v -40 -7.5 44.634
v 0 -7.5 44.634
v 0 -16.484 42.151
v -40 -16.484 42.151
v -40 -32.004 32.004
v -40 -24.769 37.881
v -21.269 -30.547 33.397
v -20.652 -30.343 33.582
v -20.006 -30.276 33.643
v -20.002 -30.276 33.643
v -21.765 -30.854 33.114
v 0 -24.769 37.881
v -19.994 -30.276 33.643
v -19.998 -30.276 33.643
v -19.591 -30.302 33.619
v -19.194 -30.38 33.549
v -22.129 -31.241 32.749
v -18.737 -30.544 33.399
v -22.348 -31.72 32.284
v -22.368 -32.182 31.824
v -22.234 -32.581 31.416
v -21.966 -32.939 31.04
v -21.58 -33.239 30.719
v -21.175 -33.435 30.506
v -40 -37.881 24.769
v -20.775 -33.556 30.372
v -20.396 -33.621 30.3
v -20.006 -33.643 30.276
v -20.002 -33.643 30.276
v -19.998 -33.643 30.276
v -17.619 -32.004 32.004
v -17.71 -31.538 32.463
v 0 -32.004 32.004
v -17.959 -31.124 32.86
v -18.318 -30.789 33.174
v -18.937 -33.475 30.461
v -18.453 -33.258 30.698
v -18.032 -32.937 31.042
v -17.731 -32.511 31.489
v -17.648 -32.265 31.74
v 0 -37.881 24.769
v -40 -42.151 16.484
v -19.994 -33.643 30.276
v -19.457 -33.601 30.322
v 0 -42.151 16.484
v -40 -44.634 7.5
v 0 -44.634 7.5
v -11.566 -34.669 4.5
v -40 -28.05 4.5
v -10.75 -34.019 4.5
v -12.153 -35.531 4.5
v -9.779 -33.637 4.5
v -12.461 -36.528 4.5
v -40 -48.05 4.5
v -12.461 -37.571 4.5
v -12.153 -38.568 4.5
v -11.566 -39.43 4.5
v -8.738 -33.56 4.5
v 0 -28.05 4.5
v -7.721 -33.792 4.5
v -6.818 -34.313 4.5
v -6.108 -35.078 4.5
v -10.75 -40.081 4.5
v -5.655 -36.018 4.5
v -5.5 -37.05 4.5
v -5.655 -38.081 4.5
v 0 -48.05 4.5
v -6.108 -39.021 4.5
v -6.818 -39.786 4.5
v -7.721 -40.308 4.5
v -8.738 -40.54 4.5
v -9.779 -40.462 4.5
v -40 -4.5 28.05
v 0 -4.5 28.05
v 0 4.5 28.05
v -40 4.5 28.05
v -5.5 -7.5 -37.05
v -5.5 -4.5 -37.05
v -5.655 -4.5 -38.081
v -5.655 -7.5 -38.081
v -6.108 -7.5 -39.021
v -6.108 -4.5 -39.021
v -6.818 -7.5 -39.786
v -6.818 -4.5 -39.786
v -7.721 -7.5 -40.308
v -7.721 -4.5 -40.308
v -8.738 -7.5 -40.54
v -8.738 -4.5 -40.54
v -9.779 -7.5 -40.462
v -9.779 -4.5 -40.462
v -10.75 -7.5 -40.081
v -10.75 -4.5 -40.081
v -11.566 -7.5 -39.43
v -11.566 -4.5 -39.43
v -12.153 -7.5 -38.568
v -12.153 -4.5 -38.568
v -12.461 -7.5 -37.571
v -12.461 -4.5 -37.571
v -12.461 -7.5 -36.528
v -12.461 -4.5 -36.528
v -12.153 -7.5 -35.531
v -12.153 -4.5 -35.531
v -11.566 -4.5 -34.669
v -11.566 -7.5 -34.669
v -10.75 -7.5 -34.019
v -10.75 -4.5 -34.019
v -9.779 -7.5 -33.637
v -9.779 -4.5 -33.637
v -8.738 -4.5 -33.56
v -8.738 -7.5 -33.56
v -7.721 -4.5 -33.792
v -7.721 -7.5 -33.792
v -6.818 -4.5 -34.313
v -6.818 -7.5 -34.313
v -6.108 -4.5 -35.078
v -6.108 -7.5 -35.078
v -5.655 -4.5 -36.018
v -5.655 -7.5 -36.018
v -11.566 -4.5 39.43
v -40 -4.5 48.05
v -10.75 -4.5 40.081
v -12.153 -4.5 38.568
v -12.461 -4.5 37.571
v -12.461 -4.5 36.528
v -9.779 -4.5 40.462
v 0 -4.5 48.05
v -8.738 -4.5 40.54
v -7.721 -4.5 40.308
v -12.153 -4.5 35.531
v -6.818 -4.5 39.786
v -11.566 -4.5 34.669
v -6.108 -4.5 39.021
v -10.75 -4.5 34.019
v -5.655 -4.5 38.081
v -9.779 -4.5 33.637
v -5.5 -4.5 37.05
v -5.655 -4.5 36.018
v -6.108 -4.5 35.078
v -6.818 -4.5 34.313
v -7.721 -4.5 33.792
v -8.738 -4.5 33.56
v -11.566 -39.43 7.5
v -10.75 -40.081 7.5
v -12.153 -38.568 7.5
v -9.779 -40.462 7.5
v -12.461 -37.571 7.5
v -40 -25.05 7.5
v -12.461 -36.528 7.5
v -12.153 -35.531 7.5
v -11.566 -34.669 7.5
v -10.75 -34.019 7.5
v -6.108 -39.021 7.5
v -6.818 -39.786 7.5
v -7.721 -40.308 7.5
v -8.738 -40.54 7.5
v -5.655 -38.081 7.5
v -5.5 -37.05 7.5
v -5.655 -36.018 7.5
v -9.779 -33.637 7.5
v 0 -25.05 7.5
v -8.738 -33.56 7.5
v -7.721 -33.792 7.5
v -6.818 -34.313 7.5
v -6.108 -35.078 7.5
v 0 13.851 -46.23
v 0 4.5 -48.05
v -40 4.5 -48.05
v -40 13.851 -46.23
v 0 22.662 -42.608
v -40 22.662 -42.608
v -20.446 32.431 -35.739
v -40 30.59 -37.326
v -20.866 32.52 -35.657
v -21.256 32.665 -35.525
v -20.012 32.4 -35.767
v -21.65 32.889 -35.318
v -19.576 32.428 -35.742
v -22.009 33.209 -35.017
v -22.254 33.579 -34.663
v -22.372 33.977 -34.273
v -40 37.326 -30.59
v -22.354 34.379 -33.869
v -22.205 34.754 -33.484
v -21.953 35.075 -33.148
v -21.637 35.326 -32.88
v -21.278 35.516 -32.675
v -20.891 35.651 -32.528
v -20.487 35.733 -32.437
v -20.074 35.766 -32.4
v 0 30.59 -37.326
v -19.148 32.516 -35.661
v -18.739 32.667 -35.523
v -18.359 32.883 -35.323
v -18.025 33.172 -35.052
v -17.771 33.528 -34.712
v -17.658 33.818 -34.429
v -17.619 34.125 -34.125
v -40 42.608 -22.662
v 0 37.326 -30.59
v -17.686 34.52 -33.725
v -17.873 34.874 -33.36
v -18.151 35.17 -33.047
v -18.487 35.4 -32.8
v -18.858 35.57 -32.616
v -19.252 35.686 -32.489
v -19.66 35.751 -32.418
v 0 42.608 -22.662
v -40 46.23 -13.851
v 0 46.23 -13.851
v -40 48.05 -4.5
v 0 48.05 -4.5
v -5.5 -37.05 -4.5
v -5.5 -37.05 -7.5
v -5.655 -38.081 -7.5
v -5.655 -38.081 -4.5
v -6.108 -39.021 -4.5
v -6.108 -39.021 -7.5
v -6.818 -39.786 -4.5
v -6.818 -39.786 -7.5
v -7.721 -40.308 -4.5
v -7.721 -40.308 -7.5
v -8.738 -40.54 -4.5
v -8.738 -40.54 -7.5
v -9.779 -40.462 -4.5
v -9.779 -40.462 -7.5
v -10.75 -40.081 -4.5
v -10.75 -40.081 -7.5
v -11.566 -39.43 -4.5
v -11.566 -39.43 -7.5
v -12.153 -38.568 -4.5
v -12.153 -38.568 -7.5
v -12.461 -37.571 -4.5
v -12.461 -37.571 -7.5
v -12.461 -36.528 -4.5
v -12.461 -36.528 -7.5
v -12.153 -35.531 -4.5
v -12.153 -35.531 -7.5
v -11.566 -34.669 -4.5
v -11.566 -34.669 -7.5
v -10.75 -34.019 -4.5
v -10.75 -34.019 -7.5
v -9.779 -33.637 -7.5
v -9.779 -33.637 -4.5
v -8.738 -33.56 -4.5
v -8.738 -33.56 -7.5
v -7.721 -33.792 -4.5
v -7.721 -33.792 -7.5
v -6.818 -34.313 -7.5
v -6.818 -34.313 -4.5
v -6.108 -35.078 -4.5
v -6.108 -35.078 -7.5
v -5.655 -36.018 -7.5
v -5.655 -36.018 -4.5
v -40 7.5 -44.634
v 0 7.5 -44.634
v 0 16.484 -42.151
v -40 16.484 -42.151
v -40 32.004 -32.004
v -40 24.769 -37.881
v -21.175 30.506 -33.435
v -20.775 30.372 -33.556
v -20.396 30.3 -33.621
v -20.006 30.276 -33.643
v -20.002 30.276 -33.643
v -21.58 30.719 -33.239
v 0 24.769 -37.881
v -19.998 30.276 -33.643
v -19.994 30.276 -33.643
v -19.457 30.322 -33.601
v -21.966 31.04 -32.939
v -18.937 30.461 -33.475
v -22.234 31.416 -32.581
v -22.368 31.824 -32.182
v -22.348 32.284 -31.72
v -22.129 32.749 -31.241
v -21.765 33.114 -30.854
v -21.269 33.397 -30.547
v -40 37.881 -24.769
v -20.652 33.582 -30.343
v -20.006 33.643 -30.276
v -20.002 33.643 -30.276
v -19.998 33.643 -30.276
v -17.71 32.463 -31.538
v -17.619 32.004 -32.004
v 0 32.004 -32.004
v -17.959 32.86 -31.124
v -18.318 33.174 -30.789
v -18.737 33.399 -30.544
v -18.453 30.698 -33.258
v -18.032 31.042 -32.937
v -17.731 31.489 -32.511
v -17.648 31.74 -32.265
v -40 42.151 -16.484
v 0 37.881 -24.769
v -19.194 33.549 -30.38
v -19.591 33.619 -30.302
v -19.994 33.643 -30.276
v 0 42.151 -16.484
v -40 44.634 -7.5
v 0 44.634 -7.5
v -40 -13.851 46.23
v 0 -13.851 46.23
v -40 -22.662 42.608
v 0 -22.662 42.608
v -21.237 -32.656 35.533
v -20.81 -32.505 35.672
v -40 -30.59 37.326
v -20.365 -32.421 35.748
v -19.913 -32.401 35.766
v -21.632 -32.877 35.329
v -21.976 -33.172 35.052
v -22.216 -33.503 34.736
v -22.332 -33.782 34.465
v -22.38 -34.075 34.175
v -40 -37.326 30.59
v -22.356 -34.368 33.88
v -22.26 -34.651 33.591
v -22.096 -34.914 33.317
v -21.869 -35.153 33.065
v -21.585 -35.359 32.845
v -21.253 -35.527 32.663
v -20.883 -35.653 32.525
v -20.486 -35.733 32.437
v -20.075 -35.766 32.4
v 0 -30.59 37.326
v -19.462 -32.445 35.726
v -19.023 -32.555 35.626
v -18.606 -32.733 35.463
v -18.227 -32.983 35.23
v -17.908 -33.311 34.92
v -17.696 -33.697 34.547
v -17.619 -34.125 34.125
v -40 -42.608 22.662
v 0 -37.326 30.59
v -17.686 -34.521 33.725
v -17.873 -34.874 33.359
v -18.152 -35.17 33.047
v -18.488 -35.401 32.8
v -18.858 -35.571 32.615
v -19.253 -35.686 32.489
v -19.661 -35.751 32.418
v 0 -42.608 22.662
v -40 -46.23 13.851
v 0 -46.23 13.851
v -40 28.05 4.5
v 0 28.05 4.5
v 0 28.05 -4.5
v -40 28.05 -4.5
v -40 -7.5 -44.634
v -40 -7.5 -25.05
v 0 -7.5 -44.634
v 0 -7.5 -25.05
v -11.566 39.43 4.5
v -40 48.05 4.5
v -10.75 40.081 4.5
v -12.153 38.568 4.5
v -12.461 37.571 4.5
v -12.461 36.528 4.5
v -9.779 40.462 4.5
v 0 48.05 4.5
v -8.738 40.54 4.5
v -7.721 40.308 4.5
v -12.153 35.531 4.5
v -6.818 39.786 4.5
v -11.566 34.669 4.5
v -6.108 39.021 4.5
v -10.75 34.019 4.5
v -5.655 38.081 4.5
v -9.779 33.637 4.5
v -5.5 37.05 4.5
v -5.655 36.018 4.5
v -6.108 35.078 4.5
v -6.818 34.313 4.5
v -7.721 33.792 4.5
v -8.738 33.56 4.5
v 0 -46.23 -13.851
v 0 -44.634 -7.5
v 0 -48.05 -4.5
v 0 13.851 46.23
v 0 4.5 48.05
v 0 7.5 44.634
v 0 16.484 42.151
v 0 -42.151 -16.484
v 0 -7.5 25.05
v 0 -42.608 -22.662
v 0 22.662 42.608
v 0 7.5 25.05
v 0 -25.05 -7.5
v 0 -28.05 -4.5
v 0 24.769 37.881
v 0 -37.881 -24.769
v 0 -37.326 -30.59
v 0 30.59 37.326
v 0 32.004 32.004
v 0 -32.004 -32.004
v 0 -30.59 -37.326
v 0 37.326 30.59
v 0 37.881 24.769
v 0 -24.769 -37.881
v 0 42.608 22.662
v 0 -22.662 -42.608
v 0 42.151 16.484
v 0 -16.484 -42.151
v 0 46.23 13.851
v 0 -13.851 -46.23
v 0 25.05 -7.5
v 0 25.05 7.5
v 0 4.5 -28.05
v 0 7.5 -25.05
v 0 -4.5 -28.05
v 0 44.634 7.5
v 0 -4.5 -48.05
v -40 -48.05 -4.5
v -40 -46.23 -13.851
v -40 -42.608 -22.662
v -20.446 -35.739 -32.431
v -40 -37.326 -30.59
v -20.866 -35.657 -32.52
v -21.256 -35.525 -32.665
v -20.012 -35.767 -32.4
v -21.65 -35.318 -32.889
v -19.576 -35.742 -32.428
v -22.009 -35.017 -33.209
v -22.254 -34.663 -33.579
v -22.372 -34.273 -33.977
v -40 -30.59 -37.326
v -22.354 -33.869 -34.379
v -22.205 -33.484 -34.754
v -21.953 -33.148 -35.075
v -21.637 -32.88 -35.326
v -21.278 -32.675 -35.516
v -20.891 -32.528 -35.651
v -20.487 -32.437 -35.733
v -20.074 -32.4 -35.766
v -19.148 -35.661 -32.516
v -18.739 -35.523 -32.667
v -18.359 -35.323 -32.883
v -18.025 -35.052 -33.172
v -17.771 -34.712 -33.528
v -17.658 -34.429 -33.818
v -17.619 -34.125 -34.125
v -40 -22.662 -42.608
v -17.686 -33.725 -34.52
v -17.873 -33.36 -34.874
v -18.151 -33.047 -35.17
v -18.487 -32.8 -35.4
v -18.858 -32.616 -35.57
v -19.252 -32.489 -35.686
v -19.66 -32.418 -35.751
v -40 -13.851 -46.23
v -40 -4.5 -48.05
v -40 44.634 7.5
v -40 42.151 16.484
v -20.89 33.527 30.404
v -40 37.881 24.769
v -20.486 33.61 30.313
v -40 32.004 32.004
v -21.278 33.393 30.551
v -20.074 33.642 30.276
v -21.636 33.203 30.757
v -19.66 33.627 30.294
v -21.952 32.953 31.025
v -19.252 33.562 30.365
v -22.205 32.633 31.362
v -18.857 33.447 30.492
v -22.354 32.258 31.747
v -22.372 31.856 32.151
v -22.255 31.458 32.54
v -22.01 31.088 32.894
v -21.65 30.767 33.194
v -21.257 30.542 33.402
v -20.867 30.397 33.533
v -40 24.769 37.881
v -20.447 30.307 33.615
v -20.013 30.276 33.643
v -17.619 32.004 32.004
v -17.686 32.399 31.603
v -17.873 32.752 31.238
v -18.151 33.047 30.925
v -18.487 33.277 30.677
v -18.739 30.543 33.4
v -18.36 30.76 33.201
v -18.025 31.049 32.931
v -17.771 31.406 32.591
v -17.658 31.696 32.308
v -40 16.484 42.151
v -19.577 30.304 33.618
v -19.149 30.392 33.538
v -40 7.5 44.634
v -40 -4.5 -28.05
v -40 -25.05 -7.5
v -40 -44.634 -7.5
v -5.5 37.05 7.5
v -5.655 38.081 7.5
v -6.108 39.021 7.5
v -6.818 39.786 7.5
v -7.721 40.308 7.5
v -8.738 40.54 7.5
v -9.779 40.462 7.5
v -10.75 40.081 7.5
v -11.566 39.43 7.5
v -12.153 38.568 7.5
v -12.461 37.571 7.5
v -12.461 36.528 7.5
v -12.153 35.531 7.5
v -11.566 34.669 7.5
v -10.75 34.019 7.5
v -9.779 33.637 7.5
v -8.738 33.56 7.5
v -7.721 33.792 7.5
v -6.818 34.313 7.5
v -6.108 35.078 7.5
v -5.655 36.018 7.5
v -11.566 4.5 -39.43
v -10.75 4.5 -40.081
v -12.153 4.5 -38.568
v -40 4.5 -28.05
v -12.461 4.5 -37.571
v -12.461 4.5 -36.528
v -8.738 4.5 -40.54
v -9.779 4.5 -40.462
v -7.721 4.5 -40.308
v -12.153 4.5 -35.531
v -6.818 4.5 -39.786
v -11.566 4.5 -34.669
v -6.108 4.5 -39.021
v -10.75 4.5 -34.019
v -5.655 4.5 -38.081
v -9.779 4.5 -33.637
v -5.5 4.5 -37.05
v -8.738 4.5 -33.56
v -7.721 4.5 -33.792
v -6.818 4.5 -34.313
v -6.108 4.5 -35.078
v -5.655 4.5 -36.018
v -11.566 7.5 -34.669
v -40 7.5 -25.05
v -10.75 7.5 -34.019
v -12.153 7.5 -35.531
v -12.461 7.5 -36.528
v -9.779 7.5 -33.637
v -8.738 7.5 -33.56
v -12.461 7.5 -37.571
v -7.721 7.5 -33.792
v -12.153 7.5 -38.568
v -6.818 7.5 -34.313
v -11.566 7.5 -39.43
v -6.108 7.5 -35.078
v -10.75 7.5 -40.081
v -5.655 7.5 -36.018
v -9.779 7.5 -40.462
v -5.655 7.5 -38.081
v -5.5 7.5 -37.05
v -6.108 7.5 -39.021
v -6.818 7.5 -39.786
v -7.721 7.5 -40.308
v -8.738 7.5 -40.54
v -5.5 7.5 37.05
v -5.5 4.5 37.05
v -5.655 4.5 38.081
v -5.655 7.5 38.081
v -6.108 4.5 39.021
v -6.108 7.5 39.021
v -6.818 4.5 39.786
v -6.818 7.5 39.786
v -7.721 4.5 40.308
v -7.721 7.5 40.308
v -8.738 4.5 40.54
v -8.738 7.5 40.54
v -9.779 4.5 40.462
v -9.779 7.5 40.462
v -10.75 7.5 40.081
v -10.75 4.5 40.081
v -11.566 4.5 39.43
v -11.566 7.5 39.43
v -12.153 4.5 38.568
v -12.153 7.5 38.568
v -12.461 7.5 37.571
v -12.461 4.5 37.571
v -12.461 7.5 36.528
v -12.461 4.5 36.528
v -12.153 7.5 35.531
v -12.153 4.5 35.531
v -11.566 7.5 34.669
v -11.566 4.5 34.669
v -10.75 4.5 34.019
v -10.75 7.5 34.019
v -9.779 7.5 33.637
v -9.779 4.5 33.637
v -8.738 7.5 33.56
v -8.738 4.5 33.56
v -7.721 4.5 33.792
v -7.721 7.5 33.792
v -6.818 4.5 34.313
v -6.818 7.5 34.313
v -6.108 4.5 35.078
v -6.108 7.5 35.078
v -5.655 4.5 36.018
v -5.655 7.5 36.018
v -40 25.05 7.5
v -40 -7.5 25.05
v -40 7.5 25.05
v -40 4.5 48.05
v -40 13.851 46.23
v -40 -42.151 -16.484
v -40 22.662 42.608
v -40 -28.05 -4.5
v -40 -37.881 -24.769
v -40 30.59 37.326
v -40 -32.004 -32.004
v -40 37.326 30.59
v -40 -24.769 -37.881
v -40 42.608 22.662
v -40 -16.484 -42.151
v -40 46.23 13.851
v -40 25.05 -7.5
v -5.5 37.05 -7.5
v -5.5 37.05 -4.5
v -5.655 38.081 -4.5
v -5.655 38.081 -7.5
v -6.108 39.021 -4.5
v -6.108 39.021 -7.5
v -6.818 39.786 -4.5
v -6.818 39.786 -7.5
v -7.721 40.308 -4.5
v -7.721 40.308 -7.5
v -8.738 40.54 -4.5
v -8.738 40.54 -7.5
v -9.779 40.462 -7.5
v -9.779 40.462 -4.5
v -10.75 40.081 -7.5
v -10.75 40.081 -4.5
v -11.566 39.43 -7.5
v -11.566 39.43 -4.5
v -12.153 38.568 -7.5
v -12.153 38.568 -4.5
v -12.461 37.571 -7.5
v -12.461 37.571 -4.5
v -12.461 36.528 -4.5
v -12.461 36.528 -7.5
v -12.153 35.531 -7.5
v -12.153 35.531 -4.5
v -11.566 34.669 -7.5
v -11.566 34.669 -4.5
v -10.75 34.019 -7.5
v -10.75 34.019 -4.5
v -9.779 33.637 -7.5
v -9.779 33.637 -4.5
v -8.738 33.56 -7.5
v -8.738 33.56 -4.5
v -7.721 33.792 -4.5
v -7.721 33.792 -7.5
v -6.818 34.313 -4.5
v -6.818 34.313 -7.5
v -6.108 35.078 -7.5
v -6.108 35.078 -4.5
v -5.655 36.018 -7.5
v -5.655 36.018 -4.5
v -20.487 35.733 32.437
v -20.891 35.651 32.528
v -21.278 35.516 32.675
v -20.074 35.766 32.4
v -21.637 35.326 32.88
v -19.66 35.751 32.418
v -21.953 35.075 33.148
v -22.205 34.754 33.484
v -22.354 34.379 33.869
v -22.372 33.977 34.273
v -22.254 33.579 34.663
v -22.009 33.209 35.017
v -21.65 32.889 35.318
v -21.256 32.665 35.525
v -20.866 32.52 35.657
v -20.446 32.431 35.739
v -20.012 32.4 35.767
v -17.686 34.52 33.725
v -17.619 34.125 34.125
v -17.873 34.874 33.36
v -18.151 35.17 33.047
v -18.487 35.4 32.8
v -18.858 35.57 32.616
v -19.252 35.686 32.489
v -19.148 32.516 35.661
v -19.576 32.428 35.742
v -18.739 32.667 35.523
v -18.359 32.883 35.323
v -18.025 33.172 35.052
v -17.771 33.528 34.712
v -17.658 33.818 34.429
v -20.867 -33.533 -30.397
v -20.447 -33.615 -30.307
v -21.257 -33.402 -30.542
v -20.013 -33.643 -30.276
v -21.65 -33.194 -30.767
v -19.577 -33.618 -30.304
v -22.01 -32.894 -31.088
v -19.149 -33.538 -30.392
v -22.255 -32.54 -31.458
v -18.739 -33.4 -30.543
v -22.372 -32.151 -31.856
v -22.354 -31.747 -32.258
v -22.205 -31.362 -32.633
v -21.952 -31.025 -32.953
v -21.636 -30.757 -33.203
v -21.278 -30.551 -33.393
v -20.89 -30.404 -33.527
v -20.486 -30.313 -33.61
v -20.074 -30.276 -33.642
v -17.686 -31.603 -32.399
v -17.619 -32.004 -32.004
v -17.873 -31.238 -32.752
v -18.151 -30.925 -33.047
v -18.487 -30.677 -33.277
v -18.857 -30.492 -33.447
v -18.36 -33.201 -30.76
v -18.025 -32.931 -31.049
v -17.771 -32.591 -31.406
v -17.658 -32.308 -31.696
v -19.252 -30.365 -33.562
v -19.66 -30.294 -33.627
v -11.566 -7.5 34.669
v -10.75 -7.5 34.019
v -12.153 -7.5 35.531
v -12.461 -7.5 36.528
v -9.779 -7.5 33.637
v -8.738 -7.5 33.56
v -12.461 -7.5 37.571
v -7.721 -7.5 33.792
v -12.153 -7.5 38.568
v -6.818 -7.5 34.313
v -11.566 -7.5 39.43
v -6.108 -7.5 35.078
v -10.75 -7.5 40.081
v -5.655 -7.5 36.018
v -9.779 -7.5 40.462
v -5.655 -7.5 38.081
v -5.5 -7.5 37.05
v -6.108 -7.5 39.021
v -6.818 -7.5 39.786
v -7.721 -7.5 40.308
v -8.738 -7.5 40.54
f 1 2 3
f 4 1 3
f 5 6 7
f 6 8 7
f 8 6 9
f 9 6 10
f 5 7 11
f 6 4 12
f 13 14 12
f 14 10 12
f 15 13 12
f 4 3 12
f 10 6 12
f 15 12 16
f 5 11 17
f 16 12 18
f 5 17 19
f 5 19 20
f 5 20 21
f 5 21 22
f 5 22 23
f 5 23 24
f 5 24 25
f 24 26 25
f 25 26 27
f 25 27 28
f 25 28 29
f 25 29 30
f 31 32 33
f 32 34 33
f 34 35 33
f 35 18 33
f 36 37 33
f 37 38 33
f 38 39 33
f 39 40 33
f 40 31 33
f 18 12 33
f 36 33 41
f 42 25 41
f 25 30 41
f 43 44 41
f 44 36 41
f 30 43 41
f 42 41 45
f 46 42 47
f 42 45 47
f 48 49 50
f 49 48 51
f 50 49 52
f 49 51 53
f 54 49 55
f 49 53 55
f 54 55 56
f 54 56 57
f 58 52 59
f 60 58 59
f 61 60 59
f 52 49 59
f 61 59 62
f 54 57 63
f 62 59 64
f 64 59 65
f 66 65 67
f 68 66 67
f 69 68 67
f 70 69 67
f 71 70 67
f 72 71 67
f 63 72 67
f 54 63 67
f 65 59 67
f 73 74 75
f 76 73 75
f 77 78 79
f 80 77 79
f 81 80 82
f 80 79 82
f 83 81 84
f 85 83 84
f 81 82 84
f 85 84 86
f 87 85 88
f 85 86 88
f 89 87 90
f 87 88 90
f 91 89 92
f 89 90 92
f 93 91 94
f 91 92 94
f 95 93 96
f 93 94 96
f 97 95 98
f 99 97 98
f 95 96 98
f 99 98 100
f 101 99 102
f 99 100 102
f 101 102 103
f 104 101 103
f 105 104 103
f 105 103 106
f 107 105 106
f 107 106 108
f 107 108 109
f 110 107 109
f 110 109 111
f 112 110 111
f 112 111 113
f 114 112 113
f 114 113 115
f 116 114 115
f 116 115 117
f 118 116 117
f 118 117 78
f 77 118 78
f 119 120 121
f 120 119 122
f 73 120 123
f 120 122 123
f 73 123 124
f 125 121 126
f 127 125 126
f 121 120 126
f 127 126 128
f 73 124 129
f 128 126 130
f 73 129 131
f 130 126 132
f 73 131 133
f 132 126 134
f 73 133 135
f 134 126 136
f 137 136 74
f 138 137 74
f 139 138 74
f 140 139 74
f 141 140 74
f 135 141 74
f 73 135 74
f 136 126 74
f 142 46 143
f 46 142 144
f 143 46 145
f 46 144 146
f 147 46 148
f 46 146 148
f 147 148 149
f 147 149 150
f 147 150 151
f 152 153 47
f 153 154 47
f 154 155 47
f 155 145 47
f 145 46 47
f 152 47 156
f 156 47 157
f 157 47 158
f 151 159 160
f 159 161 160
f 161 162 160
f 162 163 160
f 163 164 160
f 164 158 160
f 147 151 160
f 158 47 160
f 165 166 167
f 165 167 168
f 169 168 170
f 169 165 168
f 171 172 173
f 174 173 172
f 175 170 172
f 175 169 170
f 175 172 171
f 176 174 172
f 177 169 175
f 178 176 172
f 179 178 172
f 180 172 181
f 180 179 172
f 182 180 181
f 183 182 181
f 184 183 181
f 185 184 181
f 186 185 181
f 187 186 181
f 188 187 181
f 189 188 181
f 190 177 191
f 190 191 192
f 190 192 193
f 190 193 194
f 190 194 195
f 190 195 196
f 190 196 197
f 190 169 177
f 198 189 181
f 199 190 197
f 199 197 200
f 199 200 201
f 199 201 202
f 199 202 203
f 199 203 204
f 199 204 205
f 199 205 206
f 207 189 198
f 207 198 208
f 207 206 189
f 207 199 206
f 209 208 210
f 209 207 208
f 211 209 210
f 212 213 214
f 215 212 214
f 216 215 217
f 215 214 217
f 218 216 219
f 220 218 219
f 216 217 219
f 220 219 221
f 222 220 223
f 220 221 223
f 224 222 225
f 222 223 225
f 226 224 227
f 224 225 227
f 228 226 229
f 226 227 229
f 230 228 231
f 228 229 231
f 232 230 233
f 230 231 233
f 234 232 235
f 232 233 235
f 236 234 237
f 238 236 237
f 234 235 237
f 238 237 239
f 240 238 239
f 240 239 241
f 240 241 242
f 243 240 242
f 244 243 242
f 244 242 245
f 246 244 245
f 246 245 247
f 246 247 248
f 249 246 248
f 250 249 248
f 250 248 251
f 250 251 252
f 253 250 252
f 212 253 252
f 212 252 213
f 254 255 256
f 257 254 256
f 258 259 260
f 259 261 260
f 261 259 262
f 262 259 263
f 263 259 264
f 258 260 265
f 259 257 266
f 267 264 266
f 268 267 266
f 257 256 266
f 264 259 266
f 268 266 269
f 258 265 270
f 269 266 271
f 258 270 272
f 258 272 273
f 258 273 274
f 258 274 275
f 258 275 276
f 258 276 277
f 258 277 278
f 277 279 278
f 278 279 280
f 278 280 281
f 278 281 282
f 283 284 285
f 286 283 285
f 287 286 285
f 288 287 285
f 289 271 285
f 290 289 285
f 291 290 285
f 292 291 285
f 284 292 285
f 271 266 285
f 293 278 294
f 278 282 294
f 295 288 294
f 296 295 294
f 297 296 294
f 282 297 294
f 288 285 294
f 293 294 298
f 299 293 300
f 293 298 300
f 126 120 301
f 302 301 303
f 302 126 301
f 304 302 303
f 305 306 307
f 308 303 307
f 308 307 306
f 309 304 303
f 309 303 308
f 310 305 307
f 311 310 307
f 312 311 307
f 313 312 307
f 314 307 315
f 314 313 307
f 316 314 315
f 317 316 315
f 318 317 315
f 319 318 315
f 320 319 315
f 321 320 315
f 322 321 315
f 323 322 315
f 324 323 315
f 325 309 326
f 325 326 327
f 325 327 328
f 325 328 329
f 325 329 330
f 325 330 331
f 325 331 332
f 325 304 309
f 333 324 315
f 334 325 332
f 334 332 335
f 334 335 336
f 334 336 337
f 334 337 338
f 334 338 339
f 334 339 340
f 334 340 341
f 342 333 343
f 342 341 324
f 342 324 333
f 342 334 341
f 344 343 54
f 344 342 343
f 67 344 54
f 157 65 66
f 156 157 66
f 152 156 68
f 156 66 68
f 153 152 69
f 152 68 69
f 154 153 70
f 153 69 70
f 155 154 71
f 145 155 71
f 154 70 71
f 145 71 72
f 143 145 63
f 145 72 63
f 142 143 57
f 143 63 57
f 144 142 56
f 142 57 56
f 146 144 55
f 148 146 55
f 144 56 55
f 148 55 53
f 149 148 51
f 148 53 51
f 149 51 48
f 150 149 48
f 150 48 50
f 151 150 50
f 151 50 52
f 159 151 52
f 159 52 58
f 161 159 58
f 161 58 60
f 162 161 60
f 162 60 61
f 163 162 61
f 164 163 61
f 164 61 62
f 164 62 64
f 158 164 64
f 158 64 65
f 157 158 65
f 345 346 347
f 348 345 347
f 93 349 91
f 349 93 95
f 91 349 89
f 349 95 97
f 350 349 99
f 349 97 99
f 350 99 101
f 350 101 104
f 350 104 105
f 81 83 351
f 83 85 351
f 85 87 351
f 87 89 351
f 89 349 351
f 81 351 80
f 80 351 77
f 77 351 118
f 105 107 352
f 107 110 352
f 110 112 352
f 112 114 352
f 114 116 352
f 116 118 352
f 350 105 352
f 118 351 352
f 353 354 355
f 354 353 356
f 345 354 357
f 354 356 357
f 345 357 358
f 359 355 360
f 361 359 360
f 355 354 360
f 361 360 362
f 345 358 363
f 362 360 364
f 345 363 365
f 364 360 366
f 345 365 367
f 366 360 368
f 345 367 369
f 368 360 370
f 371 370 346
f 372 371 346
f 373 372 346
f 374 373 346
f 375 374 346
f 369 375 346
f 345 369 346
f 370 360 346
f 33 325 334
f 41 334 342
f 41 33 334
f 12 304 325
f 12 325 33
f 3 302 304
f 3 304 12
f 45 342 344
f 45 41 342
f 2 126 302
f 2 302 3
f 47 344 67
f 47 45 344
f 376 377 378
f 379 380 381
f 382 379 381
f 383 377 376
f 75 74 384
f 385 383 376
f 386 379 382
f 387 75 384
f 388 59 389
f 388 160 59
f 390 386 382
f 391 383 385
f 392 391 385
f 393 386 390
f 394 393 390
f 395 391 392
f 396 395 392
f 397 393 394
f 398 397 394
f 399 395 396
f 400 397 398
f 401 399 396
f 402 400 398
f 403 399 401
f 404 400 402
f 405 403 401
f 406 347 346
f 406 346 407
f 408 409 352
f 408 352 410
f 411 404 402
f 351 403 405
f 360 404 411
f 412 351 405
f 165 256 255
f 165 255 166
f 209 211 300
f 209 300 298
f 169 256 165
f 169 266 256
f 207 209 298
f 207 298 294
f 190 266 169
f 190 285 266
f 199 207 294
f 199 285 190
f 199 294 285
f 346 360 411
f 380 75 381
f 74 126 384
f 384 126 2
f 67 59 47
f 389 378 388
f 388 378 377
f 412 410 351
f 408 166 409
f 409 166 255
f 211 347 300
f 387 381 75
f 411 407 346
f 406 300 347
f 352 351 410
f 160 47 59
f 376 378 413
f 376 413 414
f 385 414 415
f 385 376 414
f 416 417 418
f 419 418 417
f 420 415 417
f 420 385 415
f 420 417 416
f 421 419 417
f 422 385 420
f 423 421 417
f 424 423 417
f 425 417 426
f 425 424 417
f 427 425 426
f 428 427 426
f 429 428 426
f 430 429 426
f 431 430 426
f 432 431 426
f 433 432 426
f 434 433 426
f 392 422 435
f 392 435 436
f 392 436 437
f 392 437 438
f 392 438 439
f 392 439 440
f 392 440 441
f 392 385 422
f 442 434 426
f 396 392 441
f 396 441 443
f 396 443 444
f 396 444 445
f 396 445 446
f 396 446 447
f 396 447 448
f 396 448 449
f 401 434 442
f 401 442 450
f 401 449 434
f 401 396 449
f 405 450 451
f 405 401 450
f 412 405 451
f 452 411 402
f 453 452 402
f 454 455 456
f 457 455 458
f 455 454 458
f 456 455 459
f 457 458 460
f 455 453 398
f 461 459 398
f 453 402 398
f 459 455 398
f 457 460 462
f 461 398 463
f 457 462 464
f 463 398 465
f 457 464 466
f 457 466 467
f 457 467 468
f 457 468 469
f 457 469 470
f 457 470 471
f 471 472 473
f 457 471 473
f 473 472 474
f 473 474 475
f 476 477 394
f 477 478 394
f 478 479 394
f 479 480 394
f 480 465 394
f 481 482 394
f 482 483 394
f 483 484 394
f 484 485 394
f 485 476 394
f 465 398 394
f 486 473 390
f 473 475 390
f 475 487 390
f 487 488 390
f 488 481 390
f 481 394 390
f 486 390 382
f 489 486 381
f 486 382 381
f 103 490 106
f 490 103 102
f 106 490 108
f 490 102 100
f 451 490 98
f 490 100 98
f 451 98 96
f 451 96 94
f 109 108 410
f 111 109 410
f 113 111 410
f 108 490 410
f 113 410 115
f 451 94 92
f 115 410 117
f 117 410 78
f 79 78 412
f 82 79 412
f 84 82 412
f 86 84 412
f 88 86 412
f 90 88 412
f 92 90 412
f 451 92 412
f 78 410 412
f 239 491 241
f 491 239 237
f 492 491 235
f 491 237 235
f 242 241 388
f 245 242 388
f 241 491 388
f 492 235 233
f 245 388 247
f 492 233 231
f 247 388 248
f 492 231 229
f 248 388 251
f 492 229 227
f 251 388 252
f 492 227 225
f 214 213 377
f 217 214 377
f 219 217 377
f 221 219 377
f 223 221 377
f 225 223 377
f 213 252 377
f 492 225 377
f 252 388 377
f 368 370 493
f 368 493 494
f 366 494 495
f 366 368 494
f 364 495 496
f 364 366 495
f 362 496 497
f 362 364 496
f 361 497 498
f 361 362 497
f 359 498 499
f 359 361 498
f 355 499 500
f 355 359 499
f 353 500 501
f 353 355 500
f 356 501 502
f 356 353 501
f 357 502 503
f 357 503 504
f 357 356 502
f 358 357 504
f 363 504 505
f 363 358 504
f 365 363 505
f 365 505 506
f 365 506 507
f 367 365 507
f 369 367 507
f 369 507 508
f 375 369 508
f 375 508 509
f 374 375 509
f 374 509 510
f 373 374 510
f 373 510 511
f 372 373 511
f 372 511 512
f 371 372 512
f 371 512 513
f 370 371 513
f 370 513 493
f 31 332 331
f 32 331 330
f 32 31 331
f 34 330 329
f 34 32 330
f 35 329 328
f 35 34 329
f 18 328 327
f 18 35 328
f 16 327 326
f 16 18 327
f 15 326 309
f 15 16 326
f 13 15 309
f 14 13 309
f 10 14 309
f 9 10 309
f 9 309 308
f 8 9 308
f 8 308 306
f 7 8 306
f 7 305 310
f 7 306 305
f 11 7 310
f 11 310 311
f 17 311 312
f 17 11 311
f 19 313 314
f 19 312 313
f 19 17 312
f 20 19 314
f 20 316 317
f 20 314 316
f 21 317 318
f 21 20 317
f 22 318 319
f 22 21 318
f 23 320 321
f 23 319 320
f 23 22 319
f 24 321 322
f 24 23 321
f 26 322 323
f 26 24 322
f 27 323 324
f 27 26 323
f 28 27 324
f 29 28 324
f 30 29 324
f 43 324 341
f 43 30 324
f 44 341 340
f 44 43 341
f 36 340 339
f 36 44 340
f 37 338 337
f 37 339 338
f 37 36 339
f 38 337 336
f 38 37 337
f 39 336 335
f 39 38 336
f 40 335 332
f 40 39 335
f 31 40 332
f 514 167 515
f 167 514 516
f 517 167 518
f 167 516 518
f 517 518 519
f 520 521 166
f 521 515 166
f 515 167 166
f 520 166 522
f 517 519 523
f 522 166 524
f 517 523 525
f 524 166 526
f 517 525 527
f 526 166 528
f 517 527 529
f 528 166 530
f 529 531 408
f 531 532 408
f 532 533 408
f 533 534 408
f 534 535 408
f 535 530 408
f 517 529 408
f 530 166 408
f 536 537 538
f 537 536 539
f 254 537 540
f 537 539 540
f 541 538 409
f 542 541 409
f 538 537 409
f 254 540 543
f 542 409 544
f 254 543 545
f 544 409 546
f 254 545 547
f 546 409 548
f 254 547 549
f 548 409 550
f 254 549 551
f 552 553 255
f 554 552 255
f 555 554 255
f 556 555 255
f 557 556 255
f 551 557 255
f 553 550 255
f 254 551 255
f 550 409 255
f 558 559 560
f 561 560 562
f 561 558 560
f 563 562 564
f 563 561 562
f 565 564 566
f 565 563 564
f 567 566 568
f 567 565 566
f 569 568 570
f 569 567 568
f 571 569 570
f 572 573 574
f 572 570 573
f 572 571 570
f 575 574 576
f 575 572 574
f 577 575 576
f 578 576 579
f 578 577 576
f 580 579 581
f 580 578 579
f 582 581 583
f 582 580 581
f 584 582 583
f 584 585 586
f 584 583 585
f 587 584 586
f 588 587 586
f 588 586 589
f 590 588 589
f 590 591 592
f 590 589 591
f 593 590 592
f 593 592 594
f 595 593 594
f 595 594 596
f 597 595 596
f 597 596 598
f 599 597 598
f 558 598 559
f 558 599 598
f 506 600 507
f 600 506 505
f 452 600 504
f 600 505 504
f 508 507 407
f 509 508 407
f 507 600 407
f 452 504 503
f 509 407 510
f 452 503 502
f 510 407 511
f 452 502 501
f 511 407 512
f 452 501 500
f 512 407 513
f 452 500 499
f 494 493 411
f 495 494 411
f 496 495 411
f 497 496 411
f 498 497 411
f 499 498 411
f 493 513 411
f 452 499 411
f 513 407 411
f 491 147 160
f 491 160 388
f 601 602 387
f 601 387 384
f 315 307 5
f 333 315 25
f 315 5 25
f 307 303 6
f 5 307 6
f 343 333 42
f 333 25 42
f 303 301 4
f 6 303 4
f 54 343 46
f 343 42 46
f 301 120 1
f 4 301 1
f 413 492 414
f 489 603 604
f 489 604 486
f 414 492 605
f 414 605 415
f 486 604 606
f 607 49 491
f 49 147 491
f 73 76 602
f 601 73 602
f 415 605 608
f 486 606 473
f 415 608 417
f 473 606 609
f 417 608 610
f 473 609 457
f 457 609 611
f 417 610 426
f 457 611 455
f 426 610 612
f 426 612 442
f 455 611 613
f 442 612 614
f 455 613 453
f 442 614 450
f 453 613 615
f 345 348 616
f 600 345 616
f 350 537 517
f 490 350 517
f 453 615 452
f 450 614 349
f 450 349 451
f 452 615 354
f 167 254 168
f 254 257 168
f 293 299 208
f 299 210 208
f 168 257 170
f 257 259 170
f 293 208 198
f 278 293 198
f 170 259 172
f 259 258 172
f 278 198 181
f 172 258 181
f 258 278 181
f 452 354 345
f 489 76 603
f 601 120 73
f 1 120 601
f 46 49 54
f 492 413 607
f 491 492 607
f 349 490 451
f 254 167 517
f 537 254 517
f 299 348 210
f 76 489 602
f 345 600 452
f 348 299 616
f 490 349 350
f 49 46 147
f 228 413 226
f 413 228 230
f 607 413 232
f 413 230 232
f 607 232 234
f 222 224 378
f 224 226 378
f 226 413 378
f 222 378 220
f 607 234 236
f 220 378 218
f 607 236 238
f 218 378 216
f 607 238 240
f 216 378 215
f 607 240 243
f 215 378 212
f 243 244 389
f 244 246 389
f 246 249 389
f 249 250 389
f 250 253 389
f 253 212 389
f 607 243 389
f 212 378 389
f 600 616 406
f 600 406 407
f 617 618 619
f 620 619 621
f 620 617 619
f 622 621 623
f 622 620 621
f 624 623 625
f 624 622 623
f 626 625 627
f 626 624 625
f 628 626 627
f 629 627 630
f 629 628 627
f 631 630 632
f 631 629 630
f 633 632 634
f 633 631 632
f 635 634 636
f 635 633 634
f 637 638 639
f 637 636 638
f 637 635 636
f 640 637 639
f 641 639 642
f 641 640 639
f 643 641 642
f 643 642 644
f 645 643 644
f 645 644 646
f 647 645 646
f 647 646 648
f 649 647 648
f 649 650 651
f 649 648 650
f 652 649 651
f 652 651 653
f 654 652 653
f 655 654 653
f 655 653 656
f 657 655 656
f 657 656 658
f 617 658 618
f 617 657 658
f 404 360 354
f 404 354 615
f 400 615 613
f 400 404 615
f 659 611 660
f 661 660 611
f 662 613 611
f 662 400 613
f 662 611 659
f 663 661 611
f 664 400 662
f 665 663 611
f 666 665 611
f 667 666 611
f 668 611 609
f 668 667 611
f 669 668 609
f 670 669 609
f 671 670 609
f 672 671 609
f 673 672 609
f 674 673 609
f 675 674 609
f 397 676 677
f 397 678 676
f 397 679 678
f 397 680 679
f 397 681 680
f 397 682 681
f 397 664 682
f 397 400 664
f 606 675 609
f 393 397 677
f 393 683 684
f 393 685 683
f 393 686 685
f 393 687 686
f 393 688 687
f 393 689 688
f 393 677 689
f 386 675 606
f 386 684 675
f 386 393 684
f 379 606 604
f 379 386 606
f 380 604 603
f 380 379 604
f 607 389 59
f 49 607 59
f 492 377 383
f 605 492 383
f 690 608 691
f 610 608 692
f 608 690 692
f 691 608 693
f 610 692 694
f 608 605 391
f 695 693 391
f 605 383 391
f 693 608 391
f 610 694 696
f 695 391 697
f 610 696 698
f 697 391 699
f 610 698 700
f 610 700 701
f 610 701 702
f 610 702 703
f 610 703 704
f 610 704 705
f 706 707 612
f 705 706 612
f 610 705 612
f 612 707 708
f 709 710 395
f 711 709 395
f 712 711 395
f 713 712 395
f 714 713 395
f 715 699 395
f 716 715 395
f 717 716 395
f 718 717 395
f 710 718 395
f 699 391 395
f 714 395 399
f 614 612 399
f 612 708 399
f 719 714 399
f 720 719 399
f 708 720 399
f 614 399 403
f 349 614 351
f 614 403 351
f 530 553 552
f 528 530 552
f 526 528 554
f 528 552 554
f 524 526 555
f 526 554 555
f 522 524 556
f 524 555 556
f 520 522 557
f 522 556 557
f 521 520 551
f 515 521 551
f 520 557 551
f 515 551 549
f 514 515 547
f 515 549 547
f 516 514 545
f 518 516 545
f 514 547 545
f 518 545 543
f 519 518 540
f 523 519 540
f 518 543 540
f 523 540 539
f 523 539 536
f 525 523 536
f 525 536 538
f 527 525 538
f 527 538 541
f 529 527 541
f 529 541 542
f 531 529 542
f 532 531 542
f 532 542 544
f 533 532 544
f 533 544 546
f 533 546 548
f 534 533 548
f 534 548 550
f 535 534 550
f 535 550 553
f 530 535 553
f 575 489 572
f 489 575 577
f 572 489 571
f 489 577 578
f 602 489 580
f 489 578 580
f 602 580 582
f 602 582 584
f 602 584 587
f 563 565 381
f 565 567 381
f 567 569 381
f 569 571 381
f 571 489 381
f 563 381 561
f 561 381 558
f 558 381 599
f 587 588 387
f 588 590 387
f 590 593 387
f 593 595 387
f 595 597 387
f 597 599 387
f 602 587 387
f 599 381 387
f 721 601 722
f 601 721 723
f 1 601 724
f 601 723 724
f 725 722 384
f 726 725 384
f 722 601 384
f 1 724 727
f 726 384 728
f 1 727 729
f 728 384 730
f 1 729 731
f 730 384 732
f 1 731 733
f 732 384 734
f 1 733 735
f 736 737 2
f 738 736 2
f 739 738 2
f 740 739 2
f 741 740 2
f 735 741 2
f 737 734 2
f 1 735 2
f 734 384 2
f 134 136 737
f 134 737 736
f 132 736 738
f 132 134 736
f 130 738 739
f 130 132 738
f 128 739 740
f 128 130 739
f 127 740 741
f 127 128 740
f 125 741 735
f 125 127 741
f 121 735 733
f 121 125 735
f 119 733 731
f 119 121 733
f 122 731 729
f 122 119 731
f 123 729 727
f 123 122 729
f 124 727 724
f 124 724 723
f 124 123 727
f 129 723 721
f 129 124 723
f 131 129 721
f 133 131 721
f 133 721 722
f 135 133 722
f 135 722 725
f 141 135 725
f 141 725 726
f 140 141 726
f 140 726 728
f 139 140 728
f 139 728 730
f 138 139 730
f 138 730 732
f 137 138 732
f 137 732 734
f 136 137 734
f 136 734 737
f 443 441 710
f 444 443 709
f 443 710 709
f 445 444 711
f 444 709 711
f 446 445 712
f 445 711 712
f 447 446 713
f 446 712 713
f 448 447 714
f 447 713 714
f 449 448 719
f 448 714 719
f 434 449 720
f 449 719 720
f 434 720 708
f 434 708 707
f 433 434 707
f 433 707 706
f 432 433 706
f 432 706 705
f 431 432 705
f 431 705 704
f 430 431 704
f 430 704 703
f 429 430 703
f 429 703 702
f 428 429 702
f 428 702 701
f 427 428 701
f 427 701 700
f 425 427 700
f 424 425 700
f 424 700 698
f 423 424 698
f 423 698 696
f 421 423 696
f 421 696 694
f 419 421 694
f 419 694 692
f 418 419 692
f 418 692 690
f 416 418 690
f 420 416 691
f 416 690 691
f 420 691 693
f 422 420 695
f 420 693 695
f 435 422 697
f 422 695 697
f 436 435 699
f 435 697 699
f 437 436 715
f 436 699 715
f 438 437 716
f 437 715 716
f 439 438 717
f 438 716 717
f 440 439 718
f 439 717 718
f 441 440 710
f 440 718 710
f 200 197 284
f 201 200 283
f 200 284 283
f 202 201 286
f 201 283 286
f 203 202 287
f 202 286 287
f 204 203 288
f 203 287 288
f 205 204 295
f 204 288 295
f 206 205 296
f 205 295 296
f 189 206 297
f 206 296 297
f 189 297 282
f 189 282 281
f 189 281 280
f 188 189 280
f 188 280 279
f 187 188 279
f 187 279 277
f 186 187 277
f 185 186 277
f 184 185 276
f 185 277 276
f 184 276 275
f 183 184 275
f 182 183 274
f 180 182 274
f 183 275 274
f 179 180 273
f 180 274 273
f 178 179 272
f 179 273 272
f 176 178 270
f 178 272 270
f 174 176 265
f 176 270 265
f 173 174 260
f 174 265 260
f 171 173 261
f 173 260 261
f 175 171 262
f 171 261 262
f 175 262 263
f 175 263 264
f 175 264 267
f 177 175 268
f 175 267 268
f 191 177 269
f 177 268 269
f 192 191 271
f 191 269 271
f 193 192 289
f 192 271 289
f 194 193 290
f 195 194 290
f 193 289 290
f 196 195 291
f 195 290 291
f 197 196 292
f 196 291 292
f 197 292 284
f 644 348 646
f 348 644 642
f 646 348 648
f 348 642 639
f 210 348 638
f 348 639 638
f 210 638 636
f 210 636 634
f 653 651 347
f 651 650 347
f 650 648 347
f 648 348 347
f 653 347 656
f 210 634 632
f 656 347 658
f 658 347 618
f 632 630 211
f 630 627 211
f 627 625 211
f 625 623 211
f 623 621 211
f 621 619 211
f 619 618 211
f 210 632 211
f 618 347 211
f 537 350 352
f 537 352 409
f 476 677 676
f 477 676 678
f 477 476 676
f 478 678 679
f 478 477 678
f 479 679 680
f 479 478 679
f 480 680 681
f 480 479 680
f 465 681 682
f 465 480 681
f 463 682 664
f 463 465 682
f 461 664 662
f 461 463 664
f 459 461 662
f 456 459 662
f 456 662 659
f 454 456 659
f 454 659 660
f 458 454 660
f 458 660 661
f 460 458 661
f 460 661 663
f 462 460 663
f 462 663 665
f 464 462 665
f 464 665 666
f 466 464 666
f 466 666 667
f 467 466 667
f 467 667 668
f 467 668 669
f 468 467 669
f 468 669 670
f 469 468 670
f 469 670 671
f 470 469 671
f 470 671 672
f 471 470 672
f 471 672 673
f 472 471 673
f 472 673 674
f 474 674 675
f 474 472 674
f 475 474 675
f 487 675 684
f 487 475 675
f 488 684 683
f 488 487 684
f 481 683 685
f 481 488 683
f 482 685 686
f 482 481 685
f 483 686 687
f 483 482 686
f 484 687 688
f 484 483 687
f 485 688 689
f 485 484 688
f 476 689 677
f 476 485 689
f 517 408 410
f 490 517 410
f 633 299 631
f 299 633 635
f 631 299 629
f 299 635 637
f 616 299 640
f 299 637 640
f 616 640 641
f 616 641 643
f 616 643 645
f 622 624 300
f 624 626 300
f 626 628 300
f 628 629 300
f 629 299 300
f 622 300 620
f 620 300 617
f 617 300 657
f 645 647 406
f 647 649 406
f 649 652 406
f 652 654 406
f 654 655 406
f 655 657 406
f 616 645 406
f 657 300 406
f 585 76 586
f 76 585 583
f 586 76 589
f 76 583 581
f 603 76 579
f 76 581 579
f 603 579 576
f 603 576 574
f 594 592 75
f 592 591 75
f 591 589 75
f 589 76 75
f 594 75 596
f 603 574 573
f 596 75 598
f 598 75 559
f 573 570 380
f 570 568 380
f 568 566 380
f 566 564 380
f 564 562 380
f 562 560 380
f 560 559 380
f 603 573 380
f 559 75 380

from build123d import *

# Parameters (mm, degrees)
SKETCH4_R               = 48.26
BOSS_EXTRUDE2_DEPTH     = 40
CUT_EXTRUDE1_DEPTH      = 41
CIRPATTERN1_COUNT       = 4
CUT_EXTRUDE2_DEPTH      = 40
CUT_EXTRUDE3_START      = -3
SKETCH7_R               = 3.5
CUT_EXTRUDE3_DEPTH      = 15
CUT_EXTRUDE4_START      = -3
SKETCH8_R               = 3.5
CUT_EXTRUDE4_DEPTH      = 15
CUT_EXTRUDE5_START      = -3.062685
SKETCH11_R              = 2.38125
CUT_EXTRUDE5_DEPTH      = 3.062685
SKETCH13_R              = 2.38125
CUT_EXTRUDE6_DEPTH      = 68.952595383
CUT_EXTRUDE6_DEPTH_BACK = 68.952595383


with BuildPart() as part:
    # Sketch4 → Boss-Extrude2 (new body)
    with BuildSketch(Plane(origin=(0, 0, 0), x_dir=(0, 0, -1), z_dir=(1, 0, 0))):
        Circle(SKETCH4_R)
    extrude(amount=-BOSS_EXTRUDE2_DEPTH)

    # Sketch6 → Cut-Extrude1 (cut, through all)
    with BuildSketch(Plane(origin=(0, 0, 0), x_dir=(0, 0, -1), z_dir=(1, 0, 0))):
        Polygon((-4.5, 277.678371005), (-4.5, 48.049740894), (-4.5, 28.049740894), (4.5, 28.049740894), (4.5, 48.049740894), (4.5, 277.678371005), (4.5, 736.935631227), (-4.5, 736.935631227), align=None)
    cut_extrude1 = extrude(amount=-CUT_EXTRUDE1_DEPTH, mode=Mode.SUBTRACT)

    # CirPattern1: Cut-Extrude1 ×4 about axis
    cirpattern1_axis = Axis((0, 0, 0), (1, 0, 0))
    for i in range(1, CIRPATTERN1_COUNT):
        add(cut_extrude1.rotate(cirpattern1_axis, i * 360 / CIRPATTERN1_COUNT), mode=Mode.SUBTRACT)

    # Sketch9 → Cut-Extrude2 (cut)
    with BuildSketch(Plane(origin=(0, 0, 0), x_dir=(0, 0, -1), z_dir=(1, 0, 0))):
        with BuildLine():
            Line((-25.049740894, -7.5), (-44.634264865, -7.5))
            ThreePointArc((-44.634264865, -7.5), (-32.003652917, -32.003652917), (-7.5, -44.634264865))
            Line((-7.5, -44.634264865), (-7.5, -25.049740894))
            Line((-7.5, -25.049740894), (7.5, -25.049740894))
            Line((7.5, -25.049740894), (7.5, -44.634264865))
            ThreePointArc((7.5, -44.634264865), (32.003652917, -32.003652917), (44.634264865, -7.5))
            Line((44.634264865, -7.5), (25.049740894, -7.5))
            Line((25.049740894, -7.5), (25.049740894, 7.5))
            Line((25.049740894, 7.5), (44.634264865, 7.5))
            ThreePointArc((44.634264865, 7.5), (32.003652917, 32.003652917), (7.5, 44.634264865))
            Line((7.5, 44.634264865), (7.5, 25.049740894))
            Line((7.5, 25.049740894), (-7.5, 25.049740894))
            Line((-7.5, 25.049740894), (-7.5, 44.634264865))
            ThreePointArc((-7.5, 44.634264865), (-32.003652917, 32.003652917), (-44.634264865, 7.5))
            Line((-44.634264865, 7.5), (-25.049740894, 7.5))
            Line((-25.049740894, 7.5), (-25.049740894, -7.5))
        make_face()
    extrude(amount=-CUT_EXTRUDE2_DEPTH, mode=Mode.SUBTRACT)

    # Sketch7 → Cut-Extrude3 (cut)
    with BuildSketch(Plane.XY.offset(-4.5).offset(CUT_EXTRUDE3_START)):
        with Locations((-9, 37.049740894)):
            Circle(SKETCH7_R)
    cut_extrude3 = extrude(amount=CUT_EXTRUDE3_DEPTH, mode=Mode.SUBTRACT)

    # Sketch8 → Cut-Extrude4 (cut)
    with BuildSketch(Plane.XZ.offset(-4.5).offset(CUT_EXTRUDE4_START)):
        with Locations((-9, 37.049740894)):
            Circle(SKETCH8_R)
    cut_extrude4 = extrude(amount=CUT_EXTRUDE4_DEPTH, mode=Mode.SUBTRACT)

    # Mirror1: Cut-Extrude3 across plane
    add(cut_extrude3.mirror(Plane.ZX), mode=Mode.SUBTRACT)

    # Mirror2: Cut-Extrude4 across plane
    add(cut_extrude4.mirror(Plane.XY), mode=Mode.SUBTRACT)

    # Sketch11 → Cut-Extrude5 (cut)
    with BuildSketch(Plane(origin=(0, -34.12497326, 34.12497326), x_dir=(1, 0, 0), z_dir=(0, -0.707106781, 0.707106781)).offset(CUT_EXTRUDE5_START)):
        with Locations((-20, 0)):
            Circle(SKETCH11_R)
    cut_extrude5 = extrude(amount=CUT_EXTRUDE5_DEPTH, mode=Mode.SUBTRACT)

    # Mirror3: Cut-Extrude5 across plane
    add(cut_extrude5.mirror(Plane(origin=(0, 0, 0), x_dir=(0, 0.707106781, 0.707106781), z_dir=(0, 0.707106781, -0.707106781))), mode=Mode.SUBTRACT)

    # Sketch13 → Cut-Extrude6 (cut, two sides)
    with BuildSketch(Plane(origin=(0, 0, 0), x_dir=(1, 0, 0), z_dir=(0, 0.707106781, 0.707106781))) as cut_extrude6_sk:
        with Locations((-20, 0)):
            Circle(SKETCH13_R)
    extrude(amount=CUT_EXTRUDE6_DEPTH, mode=Mode.SUBTRACT)
    extrude(cut_extrude6_sk.sketch, amount=-CUT_EXTRUDE6_DEPTH_BACK, mode=Mode.SUBTRACT)


solid = part.part
